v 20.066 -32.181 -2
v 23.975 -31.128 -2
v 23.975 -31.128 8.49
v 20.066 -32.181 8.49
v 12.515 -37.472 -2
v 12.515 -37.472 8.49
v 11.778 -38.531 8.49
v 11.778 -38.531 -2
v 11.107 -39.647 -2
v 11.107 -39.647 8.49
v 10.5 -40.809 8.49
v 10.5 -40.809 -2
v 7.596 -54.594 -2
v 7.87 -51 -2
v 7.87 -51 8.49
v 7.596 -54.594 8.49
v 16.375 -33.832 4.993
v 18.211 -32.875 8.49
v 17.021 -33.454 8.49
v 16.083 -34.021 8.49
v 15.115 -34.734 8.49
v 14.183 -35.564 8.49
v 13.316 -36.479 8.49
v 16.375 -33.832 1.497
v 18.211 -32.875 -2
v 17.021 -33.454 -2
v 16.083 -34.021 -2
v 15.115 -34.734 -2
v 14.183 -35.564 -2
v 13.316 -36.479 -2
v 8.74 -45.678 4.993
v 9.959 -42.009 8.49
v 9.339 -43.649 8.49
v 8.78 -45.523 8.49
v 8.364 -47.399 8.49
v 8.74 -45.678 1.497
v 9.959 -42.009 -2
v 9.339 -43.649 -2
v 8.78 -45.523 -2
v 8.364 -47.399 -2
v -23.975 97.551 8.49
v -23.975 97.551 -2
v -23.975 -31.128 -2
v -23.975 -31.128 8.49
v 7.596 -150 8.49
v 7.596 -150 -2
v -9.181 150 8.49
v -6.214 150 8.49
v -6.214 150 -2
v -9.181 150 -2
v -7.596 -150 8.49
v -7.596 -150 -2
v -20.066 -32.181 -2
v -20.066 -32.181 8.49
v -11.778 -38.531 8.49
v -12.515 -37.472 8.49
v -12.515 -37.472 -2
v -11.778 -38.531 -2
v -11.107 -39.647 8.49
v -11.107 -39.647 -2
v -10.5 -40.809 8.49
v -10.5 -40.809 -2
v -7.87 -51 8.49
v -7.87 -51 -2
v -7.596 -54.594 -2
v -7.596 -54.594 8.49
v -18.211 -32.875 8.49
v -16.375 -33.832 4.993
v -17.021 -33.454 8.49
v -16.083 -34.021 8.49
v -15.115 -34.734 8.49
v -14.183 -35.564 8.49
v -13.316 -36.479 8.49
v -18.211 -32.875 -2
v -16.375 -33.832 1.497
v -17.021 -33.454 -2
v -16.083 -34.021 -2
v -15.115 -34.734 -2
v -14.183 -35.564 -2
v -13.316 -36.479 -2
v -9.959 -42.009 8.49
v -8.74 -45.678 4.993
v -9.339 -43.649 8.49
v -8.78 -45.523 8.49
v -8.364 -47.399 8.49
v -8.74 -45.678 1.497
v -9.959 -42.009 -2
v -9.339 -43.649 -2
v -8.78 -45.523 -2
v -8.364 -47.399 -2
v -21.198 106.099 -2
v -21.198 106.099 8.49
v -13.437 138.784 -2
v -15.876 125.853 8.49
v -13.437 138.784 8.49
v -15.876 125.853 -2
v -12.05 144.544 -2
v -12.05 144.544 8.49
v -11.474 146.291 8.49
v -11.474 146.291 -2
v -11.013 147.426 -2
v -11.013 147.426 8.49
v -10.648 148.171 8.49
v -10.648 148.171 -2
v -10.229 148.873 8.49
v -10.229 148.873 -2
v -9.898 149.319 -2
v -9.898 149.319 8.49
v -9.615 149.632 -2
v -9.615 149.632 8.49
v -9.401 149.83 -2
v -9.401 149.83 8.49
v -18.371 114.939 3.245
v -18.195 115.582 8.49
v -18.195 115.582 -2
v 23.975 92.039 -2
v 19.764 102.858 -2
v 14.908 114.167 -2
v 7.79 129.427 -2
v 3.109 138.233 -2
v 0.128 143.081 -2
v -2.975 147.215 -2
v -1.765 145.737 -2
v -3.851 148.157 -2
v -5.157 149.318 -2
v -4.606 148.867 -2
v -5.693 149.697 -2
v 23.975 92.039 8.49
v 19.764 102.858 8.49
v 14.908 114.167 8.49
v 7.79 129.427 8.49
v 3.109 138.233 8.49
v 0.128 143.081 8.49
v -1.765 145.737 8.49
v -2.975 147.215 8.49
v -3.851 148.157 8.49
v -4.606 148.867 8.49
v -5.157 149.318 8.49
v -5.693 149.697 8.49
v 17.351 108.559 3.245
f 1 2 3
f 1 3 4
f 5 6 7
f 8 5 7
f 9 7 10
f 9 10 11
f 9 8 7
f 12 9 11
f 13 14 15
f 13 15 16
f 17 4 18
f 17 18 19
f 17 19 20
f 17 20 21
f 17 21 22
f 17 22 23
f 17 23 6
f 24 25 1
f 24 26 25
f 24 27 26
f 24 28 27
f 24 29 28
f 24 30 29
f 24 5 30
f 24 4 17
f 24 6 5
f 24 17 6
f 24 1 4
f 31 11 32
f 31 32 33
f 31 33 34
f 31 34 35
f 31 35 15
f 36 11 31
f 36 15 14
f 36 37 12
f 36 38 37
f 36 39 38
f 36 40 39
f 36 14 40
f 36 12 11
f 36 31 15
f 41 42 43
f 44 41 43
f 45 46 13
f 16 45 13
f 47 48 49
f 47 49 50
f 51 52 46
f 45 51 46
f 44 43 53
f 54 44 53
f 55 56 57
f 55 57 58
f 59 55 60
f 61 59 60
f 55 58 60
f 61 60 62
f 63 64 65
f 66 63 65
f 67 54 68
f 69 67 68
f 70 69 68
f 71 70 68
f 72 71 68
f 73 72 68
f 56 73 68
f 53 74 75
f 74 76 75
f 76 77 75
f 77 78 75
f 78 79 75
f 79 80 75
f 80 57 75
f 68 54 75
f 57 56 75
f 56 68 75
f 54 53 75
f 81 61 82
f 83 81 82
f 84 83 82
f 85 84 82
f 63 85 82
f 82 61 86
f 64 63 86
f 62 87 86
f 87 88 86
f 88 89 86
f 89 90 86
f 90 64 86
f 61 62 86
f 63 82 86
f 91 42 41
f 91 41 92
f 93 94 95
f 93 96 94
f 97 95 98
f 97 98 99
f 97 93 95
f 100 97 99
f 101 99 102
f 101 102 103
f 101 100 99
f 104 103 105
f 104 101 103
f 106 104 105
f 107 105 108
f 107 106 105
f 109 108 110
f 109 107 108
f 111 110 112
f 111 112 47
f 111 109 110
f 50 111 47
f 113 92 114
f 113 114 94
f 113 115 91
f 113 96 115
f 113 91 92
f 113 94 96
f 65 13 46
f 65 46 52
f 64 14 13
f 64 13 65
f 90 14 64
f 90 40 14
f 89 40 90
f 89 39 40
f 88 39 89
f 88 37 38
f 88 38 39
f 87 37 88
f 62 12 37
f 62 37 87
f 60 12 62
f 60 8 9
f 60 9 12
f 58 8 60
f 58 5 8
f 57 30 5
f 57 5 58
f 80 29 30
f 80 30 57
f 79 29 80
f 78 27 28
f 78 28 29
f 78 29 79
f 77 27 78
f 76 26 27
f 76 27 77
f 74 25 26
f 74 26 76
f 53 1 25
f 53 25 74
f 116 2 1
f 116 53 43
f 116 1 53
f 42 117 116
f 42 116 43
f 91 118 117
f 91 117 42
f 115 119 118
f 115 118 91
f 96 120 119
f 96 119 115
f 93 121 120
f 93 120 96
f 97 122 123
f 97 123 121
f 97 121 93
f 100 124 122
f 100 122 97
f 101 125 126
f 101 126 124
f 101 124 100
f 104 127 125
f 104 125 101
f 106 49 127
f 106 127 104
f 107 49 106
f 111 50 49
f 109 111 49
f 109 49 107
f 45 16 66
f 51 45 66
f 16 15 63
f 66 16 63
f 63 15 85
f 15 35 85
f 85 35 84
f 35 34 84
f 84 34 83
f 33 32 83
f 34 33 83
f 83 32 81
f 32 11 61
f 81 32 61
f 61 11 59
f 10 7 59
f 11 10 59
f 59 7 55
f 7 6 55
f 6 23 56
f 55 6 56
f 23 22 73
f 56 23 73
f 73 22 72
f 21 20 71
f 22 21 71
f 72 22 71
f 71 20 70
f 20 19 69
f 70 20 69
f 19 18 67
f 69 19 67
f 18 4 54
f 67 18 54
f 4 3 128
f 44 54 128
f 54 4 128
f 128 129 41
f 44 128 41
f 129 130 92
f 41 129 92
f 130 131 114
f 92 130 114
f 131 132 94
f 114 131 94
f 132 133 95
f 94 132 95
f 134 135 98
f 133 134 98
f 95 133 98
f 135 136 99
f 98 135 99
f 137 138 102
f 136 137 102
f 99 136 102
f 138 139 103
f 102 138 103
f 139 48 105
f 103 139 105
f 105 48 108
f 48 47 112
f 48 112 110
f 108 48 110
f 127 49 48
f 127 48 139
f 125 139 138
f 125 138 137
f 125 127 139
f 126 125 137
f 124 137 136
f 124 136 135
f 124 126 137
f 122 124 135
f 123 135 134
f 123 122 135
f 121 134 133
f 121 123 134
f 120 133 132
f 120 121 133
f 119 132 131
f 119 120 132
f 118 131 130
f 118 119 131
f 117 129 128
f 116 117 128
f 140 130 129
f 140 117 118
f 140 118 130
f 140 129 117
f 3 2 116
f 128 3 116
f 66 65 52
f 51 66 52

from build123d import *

# Parameters (mm, degrees)
BOSS_EXTRUDE1_DEPTH      = 8.49
BOSS_EXTRUDE1_DEPTH_BACK = 2


with BuildPart() as part:
    # Sketch5 → Boss-Extrude1 (new, two sides: drawn at the far end of the back side and taken through both)
    with BuildSketch(Plane.XY.offset(-BOSS_EXTRUDE1_DEPTH_BACK)):
        with BuildLine():
            add(Edge.make_bspline(
                [(-6.214416506, 150), (-0.083680578, 146.836659722), (12.227049193, 121.171627413), (22.115504043, 97.266361341), (23.975, 92.038961998)],
                knots=[0.59541155, 0.59541155, 0.59541155, 0.59541155, 0.789536521, 0.848897281, 0.848897281, 0.848897281, 0.848897281], degree=3))
            Line((-6.214416506, 150), (-9.181360733, 150))
            add(Edge.make_bspline(
                [(-23.975, 97.550523877), (-22.525140626, 102.797342224), (-14.830547849, 121.396895041), (-13.344437158, 147.084687463), (-9.181360733, 150)],
                knots=[0.316420869, 0.316420869, 0.316420869, 0.316420869, 0.391637385, 0.56041045, 0.56041045, 0.56041045, 0.56041045], degree=3))
            Line((-23.975, 97.550523877), (-23.975, -31.128230966))
            add(Edge.make_bspline(
                [(-23.975, -31.128230966), (-21.293057089, -31.780629914), (-13.925723024, -33.572778799), (-8.294753832, -44.012214815), (-7.791781952, -51.627914113), (-7.595916378, -54.593593445)],
                knots=[0, 0, 0, 0, 0.258985483, 0.711436685, 1, 1, 1, 1], degree=3))
            Line((-7.595916378, -54.593593445), (-7.595916378, -150))
            Line((-7.595916378, -150), (7.595916378, -150))
            Line((7.595916378, -150), (7.595916378, -54.593593445))
            add(Edge.make_bspline(
                [(23.975, -31.128230966), (21.293057089, -31.780629914), (13.925723024, -33.572778799), (8.294753832, -44.012214815), (7.791781952, -51.627914113), (7.595916378, -54.593593445)],
                knots=[0, 0, 0, 0, 0.258985483, 0.711436685, 1, 1, 1, 1], degree=3))
            Line((23.975, -31.128230966), (23.975, 92.038961998))
        make_face()
    extrude(amount=BOSS_EXTRUDE1_DEPTH + BOSS_EXTRUDE1_DEPTH_BACK)


solid = part.part
